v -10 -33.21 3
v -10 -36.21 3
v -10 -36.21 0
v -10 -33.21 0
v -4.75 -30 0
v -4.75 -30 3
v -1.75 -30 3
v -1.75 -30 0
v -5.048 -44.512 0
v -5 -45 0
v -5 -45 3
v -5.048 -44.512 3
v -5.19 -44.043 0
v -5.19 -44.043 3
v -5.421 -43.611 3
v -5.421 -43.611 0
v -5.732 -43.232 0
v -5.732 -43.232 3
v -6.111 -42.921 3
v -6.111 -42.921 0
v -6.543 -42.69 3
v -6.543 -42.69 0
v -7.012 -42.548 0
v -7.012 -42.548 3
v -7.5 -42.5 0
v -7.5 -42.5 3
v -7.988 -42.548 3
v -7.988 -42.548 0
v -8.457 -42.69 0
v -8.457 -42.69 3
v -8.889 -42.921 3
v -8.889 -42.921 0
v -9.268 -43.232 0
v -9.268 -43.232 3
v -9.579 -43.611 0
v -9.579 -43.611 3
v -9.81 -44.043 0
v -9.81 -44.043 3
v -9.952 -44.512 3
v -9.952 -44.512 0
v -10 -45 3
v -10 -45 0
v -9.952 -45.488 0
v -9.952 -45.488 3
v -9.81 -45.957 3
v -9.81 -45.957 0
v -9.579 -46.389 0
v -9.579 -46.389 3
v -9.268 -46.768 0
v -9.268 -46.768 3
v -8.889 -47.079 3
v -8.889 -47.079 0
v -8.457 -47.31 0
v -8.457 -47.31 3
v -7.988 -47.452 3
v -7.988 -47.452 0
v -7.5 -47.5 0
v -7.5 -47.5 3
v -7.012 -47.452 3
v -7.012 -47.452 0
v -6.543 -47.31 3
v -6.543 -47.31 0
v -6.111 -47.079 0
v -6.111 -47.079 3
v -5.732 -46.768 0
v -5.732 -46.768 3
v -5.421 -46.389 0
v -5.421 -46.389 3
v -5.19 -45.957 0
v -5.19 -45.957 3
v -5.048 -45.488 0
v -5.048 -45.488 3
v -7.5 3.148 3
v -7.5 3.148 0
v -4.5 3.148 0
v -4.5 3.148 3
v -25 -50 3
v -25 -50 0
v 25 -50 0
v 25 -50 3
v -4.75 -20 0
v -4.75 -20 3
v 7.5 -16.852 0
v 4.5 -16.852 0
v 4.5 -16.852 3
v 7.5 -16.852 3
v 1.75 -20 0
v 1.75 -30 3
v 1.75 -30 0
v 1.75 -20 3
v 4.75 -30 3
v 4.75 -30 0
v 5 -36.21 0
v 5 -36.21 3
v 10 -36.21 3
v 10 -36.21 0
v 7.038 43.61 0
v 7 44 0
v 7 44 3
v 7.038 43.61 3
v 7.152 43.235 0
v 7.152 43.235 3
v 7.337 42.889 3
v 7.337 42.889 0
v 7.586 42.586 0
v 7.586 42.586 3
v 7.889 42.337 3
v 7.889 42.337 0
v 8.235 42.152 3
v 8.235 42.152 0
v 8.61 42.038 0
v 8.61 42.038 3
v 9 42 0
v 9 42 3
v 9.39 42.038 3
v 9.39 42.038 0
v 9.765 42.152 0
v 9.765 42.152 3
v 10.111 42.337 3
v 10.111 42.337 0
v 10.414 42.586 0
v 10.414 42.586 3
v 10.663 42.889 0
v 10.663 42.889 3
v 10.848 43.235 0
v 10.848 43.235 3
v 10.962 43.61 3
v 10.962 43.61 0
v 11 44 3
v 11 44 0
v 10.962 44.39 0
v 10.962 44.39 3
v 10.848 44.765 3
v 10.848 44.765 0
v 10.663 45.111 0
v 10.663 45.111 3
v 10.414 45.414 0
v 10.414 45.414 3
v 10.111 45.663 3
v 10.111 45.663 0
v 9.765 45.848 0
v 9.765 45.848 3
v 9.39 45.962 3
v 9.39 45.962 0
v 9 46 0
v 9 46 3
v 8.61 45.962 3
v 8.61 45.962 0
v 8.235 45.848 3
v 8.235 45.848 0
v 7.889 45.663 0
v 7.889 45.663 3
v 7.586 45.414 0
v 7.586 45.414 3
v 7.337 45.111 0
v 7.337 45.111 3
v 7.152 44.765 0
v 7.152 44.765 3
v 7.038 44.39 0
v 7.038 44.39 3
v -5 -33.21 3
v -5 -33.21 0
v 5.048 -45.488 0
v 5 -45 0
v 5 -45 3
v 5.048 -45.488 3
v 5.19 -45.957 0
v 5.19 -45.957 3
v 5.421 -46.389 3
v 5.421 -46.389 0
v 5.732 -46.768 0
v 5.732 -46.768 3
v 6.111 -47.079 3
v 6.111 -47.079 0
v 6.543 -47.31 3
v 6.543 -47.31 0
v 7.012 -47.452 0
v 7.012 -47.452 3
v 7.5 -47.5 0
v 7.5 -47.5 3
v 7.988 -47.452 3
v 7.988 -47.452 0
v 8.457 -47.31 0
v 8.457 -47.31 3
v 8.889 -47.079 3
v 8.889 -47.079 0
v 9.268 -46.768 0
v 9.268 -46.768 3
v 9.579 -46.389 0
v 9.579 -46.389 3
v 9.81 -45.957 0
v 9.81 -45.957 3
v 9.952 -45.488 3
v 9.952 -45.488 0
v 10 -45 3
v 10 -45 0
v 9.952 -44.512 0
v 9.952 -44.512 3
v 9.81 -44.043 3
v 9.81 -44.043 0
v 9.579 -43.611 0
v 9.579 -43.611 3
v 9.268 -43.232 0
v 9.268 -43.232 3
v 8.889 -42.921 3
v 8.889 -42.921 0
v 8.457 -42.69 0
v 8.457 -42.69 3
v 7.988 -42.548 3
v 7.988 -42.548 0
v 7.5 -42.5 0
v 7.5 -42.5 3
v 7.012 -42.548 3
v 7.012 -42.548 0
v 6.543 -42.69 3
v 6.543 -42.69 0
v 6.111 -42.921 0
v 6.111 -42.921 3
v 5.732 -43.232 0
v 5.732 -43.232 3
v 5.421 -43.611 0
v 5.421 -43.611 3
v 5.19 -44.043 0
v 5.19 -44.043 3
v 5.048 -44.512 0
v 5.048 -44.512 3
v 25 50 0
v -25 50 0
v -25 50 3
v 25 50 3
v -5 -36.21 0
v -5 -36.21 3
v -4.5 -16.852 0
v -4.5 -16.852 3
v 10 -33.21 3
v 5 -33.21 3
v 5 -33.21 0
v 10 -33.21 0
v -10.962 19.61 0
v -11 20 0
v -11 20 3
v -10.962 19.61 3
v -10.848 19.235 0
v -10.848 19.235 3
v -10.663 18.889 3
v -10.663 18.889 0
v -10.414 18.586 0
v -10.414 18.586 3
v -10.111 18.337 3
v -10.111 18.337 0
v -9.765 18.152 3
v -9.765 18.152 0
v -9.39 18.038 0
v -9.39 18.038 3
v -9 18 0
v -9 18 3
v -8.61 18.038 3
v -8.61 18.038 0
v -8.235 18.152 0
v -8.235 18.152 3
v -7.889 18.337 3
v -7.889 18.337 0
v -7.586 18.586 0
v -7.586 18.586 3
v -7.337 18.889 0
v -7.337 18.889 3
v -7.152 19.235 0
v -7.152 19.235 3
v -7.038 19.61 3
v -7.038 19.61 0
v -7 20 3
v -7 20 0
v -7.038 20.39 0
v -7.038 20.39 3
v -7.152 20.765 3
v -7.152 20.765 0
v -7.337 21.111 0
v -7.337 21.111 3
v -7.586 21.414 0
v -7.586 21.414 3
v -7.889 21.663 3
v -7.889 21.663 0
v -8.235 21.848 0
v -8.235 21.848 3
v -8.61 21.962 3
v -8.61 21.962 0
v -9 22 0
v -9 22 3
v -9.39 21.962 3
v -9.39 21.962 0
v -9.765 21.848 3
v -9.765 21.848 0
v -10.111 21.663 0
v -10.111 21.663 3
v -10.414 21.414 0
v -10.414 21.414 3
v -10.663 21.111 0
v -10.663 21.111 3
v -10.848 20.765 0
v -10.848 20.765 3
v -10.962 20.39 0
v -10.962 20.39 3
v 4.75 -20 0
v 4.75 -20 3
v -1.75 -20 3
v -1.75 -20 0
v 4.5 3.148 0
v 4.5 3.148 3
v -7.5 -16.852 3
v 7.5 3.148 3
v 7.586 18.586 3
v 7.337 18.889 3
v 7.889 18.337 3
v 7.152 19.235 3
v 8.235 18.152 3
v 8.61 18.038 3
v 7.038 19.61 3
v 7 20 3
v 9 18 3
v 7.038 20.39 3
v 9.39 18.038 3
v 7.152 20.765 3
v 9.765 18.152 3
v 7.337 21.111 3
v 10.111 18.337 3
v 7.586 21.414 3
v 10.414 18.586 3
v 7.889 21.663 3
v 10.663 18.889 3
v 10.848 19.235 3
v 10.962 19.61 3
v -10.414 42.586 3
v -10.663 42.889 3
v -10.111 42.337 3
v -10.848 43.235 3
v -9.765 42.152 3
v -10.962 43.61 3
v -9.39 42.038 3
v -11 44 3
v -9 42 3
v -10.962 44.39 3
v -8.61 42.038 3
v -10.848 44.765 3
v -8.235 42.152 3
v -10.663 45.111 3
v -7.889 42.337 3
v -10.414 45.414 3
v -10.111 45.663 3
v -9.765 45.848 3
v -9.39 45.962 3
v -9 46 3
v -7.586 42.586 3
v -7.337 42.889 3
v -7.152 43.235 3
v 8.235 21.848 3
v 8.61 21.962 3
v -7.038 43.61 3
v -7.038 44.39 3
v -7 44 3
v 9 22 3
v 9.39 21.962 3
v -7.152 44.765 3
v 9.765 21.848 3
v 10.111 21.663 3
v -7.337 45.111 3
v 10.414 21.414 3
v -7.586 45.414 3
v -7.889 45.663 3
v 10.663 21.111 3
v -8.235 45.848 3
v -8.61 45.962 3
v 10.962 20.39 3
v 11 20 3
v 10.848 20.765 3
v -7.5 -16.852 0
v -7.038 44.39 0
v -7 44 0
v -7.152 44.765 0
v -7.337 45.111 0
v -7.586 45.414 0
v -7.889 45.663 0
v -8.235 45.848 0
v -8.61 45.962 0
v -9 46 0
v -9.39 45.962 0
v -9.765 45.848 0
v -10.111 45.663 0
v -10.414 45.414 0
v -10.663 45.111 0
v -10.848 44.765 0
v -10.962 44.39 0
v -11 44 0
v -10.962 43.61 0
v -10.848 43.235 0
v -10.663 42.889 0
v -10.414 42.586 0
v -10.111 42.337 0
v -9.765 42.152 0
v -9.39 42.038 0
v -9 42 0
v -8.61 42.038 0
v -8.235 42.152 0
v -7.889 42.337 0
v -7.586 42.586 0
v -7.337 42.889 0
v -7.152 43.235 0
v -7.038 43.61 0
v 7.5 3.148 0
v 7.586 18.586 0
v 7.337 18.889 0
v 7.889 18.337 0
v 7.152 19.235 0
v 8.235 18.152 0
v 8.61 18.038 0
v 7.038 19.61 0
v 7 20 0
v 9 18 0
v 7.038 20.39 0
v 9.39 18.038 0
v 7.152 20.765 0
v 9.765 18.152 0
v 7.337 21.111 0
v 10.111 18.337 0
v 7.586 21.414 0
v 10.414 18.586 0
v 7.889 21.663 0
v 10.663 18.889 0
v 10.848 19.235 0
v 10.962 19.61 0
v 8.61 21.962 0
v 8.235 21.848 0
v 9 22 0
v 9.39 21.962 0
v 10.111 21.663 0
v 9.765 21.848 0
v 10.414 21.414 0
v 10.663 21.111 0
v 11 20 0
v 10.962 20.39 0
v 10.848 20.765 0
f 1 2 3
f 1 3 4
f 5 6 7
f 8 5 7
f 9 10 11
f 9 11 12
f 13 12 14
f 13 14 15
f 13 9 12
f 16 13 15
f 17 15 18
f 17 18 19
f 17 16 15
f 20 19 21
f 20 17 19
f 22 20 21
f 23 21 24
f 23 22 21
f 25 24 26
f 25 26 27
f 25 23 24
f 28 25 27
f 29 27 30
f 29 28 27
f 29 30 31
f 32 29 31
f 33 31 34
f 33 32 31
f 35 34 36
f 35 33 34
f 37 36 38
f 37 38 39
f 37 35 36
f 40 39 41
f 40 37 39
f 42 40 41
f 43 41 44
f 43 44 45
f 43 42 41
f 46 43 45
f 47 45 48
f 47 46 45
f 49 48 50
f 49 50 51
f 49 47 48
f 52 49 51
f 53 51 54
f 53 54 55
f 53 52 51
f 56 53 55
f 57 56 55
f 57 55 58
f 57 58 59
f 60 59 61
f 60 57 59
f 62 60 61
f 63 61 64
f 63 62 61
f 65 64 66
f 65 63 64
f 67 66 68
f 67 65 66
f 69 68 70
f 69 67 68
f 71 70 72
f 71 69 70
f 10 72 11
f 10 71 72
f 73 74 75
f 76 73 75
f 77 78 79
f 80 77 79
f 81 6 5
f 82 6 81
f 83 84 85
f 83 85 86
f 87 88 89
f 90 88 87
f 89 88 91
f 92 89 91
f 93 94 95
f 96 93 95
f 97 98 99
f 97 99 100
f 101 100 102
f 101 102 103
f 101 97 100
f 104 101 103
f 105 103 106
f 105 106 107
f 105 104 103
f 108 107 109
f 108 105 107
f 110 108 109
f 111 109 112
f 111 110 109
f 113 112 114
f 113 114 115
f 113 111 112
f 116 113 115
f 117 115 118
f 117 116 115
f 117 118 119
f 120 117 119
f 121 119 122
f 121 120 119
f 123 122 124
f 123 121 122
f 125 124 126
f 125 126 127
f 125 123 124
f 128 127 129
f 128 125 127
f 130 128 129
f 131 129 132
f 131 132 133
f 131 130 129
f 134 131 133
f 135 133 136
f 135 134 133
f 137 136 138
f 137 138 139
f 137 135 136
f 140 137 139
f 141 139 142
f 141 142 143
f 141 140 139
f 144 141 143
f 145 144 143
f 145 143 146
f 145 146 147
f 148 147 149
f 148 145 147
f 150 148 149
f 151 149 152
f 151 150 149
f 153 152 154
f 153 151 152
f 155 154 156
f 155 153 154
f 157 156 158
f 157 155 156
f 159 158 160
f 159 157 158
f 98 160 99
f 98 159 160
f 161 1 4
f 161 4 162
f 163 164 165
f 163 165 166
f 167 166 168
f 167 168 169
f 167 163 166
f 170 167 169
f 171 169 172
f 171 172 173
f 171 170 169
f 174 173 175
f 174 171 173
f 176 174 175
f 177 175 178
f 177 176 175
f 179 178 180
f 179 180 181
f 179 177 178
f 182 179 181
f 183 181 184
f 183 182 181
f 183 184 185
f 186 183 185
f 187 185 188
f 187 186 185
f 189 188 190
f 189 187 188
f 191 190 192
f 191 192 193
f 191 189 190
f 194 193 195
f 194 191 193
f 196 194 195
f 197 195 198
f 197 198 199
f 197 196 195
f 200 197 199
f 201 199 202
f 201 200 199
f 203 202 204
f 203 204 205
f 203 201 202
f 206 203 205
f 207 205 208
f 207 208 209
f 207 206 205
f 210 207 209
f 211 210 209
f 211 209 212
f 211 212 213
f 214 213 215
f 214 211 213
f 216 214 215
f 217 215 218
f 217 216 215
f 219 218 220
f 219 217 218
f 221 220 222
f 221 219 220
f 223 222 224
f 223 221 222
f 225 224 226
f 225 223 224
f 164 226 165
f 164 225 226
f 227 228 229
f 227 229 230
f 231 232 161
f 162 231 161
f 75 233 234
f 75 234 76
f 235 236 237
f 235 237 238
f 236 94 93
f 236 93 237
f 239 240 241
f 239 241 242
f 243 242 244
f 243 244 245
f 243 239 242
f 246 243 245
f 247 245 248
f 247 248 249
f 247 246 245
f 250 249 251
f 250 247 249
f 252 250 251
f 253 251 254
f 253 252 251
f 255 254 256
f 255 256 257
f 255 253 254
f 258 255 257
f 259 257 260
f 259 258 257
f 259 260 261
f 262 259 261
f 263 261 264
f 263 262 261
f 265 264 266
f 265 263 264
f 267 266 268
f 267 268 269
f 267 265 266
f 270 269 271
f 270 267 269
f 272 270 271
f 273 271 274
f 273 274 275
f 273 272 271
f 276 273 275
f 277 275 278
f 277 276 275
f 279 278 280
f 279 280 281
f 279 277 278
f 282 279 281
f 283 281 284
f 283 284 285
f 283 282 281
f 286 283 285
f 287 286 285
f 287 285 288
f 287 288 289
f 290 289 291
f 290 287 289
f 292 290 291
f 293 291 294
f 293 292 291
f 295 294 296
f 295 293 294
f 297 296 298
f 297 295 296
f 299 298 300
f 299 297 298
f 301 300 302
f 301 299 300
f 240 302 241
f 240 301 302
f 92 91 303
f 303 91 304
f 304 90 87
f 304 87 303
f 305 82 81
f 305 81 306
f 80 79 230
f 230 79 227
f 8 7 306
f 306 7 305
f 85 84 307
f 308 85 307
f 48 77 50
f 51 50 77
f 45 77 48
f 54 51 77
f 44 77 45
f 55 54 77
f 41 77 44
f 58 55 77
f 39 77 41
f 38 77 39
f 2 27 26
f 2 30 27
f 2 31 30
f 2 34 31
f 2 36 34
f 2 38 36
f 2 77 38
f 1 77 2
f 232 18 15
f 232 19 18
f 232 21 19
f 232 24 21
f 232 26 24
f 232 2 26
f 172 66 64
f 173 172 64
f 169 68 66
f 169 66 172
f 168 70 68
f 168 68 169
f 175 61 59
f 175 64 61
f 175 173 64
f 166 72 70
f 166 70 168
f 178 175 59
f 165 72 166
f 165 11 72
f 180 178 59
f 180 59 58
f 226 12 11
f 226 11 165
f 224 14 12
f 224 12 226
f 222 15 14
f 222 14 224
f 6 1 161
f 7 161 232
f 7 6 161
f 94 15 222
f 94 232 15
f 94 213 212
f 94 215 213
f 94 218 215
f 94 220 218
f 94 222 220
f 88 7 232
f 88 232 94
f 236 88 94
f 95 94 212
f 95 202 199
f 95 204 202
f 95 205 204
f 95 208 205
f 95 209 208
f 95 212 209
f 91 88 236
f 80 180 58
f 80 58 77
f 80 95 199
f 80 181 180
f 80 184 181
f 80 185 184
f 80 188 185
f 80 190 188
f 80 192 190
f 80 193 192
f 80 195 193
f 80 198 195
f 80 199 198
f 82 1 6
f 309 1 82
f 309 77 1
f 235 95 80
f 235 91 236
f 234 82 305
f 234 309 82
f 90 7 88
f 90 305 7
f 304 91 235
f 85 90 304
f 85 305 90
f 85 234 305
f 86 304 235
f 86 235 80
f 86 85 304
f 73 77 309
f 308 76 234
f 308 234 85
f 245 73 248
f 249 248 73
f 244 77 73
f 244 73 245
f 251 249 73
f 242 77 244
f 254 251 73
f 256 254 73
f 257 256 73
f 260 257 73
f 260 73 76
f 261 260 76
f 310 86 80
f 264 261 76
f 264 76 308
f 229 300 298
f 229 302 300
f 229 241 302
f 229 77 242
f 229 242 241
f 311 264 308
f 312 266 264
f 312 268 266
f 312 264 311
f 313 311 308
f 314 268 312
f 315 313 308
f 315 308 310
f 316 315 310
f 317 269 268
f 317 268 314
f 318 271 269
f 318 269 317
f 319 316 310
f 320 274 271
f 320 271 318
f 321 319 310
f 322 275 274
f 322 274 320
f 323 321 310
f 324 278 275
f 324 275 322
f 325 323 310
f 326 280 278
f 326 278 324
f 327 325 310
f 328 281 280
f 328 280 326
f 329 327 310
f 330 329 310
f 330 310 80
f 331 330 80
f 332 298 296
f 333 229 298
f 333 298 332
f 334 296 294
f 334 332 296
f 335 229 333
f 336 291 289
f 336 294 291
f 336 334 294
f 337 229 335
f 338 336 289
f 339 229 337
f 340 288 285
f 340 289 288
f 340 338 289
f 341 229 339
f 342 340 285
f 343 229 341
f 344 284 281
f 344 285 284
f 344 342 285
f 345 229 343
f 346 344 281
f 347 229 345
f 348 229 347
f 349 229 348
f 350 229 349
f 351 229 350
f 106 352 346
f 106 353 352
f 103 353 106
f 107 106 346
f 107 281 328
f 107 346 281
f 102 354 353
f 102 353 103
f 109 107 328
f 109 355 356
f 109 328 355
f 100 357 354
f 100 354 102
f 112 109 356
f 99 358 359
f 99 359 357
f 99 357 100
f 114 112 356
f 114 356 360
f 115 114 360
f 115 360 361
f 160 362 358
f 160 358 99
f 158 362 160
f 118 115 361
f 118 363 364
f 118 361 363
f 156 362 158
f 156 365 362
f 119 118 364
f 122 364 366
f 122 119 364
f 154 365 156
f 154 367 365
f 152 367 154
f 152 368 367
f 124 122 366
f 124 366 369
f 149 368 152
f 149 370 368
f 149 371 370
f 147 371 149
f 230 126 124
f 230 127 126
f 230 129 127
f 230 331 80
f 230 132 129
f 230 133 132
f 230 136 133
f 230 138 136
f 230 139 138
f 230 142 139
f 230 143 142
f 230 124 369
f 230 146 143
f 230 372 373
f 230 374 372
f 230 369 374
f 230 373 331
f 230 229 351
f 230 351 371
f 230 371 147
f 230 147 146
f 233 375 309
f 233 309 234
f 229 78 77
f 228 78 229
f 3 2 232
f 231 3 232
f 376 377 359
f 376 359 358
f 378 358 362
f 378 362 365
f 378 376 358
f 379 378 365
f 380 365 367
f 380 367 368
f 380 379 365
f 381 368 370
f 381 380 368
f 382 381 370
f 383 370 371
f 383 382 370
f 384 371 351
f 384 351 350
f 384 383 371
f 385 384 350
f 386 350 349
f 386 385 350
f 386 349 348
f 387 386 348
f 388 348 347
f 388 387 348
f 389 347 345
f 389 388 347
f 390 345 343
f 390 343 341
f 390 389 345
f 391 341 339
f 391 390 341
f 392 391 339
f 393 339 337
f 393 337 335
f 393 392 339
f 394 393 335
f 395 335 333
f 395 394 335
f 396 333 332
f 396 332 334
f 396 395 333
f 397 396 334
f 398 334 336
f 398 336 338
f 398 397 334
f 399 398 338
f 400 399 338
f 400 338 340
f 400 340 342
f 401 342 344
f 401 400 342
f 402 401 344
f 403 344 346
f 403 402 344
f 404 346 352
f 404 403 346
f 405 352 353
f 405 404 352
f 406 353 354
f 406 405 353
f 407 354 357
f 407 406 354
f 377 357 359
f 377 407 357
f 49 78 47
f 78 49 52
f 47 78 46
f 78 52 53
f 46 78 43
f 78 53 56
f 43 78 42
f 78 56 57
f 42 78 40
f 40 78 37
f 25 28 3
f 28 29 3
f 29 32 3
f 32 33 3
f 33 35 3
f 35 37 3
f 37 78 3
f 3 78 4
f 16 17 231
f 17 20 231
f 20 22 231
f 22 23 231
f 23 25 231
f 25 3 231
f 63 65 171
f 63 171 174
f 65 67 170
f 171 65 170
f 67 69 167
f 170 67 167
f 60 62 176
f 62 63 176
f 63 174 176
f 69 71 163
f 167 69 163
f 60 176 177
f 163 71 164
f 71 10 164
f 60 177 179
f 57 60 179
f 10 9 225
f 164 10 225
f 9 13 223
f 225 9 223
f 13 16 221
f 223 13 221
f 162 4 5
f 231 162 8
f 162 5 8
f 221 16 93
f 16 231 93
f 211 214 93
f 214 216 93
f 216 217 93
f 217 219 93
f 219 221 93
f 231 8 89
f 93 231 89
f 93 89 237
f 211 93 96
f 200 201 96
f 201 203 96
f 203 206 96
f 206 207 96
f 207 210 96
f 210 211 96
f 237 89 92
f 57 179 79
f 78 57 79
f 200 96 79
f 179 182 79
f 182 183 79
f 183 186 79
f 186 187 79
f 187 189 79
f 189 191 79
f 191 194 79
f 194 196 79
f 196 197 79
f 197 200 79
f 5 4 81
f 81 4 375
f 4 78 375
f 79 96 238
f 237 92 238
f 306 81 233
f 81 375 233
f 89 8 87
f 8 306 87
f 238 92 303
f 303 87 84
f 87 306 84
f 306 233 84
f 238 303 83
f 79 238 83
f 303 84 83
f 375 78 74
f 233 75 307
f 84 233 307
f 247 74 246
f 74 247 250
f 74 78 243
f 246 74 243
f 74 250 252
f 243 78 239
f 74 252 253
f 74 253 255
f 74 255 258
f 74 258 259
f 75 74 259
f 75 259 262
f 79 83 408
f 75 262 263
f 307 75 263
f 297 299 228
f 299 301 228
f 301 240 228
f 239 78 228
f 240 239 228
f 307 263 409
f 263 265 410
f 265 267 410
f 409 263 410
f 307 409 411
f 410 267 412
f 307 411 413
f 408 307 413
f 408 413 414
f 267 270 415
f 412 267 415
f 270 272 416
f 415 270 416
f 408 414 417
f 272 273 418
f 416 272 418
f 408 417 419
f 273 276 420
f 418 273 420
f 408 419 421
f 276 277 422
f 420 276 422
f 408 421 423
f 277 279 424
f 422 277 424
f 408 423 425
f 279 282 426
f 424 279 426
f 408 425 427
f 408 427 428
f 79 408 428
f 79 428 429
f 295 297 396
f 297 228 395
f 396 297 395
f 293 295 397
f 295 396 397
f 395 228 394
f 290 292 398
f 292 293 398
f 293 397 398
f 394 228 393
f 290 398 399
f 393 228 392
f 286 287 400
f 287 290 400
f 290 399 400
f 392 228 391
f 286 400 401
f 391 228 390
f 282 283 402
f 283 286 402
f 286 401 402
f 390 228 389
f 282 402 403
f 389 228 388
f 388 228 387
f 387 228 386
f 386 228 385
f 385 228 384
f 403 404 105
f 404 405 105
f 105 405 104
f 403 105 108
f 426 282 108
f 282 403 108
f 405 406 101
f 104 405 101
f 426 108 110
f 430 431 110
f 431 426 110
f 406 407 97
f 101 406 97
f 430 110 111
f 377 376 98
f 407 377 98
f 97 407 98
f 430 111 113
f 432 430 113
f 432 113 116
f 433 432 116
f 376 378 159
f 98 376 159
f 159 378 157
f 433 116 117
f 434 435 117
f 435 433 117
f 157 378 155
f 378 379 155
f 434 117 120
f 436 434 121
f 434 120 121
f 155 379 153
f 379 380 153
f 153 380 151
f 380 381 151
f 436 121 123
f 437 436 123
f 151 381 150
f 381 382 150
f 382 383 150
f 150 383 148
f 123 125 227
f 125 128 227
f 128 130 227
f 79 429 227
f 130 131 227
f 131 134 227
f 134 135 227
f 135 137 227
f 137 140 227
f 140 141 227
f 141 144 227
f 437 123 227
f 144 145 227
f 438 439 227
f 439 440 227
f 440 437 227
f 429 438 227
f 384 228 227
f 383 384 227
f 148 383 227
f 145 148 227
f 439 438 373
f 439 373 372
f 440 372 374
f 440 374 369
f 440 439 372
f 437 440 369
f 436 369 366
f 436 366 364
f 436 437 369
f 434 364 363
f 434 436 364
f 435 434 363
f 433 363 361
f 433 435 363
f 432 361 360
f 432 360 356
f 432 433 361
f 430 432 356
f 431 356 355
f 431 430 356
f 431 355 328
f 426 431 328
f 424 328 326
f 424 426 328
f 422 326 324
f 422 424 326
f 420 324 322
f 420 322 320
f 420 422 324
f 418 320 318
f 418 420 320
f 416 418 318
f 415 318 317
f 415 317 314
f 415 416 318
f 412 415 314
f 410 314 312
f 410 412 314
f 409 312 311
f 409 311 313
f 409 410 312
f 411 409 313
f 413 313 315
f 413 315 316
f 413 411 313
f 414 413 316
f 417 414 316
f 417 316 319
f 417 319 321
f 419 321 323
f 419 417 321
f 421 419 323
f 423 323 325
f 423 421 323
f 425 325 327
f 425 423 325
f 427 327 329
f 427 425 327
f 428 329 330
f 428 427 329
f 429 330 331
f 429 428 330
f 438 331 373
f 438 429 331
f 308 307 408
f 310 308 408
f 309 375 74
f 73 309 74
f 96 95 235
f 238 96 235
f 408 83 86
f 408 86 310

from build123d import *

# Parameters (mm, degrees)
SKETCH1_W           = 50
SKETCH1_H           = 100
SKETCH1_R           = 2
SKETCH1_R_2         = 2.5
SKETCH1_W_2         = 3
SKETCH1_H_2         = 20
BOSS_EXTRUDE1_DEPTH = 3
SKETCH2_W           = 3
SKETCH2_H           = 10
CUT_EXTRUDE1_DEPTH  = 10
SKETCH3_W           = 5
SKETCH3_H           = 3
CUT_EXTRUDE2_DEPTH  = 56.982140009


with BuildPart() as part:
    # Sketch1 → Boss-Extrude1 (new body)
    with BuildSketch(Plane.XY):
        Rectangle(SKETCH1_W, SKETCH1_H)
        with Locations((-9, 44)):
            Circle(SKETCH1_R, mode=Mode.SUBTRACT)
        with Locations(Location((9, 44, 0), (0, 0, 180))):
            Circle(SKETCH1_R, mode=Mode.SUBTRACT)
        with Locations(Location((-9, 20, 0), (0, 0, 180))):
            Circle(SKETCH1_R, mode=Mode.SUBTRACT)
        with Locations((9, 20)):
            Circle(SKETCH1_R, mode=Mode.SUBTRACT)
        with Locations((-7.5, -45)):
            Circle(SKETCH1_R_2, mode=Mode.SUBTRACT)
        with Locations(Location((7.5, -45, 0), (0, 0, 180))):
            Circle(SKETCH1_R_2, mode=Mode.SUBTRACT)
        with Locations((6, -6.851771234)):
            Rectangle(SKETCH1_W_2, SKETCH1_H_2, mode=Mode.SUBTRACT)
        with Locations((-6, -6.851771234)):
            Rectangle(SKETCH1_W_2, SKETCH1_H_2, mode=Mode.SUBTRACT)
    extrude(amount=BOSS_EXTRUDE1_DEPTH)

    # Sketch2 → Cut-Extrude1 (cut)
    with BuildSketch(Plane.XY.offset(3)):
        with Locations((3.25, -25)):
            Rectangle(SKETCH2_W, SKETCH2_H)
        with Locations((-3.25, -25)):
            Rectangle(SKETCH2_W, SKETCH2_H)
    extrude(amount=-CUT_EXTRUDE1_DEPTH, mode=Mode.SUBTRACT)

    # Sketch3 → Cut-Extrude2 (cut, through all)
    with BuildSketch(Plane.XY.offset(3)):
        with Locations((-7.5, -34.709613659)):
            Rectangle(SKETCH3_W, SKETCH3_H)
        with Locations((7.5, -34.709613659)):
            Rectangle(SKETCH3_W, SKETCH3_H)
    extrude(amount=-CUT_EXTRUDE2_DEPTH, mode=Mode.SUBTRACT)


solid = part.part
